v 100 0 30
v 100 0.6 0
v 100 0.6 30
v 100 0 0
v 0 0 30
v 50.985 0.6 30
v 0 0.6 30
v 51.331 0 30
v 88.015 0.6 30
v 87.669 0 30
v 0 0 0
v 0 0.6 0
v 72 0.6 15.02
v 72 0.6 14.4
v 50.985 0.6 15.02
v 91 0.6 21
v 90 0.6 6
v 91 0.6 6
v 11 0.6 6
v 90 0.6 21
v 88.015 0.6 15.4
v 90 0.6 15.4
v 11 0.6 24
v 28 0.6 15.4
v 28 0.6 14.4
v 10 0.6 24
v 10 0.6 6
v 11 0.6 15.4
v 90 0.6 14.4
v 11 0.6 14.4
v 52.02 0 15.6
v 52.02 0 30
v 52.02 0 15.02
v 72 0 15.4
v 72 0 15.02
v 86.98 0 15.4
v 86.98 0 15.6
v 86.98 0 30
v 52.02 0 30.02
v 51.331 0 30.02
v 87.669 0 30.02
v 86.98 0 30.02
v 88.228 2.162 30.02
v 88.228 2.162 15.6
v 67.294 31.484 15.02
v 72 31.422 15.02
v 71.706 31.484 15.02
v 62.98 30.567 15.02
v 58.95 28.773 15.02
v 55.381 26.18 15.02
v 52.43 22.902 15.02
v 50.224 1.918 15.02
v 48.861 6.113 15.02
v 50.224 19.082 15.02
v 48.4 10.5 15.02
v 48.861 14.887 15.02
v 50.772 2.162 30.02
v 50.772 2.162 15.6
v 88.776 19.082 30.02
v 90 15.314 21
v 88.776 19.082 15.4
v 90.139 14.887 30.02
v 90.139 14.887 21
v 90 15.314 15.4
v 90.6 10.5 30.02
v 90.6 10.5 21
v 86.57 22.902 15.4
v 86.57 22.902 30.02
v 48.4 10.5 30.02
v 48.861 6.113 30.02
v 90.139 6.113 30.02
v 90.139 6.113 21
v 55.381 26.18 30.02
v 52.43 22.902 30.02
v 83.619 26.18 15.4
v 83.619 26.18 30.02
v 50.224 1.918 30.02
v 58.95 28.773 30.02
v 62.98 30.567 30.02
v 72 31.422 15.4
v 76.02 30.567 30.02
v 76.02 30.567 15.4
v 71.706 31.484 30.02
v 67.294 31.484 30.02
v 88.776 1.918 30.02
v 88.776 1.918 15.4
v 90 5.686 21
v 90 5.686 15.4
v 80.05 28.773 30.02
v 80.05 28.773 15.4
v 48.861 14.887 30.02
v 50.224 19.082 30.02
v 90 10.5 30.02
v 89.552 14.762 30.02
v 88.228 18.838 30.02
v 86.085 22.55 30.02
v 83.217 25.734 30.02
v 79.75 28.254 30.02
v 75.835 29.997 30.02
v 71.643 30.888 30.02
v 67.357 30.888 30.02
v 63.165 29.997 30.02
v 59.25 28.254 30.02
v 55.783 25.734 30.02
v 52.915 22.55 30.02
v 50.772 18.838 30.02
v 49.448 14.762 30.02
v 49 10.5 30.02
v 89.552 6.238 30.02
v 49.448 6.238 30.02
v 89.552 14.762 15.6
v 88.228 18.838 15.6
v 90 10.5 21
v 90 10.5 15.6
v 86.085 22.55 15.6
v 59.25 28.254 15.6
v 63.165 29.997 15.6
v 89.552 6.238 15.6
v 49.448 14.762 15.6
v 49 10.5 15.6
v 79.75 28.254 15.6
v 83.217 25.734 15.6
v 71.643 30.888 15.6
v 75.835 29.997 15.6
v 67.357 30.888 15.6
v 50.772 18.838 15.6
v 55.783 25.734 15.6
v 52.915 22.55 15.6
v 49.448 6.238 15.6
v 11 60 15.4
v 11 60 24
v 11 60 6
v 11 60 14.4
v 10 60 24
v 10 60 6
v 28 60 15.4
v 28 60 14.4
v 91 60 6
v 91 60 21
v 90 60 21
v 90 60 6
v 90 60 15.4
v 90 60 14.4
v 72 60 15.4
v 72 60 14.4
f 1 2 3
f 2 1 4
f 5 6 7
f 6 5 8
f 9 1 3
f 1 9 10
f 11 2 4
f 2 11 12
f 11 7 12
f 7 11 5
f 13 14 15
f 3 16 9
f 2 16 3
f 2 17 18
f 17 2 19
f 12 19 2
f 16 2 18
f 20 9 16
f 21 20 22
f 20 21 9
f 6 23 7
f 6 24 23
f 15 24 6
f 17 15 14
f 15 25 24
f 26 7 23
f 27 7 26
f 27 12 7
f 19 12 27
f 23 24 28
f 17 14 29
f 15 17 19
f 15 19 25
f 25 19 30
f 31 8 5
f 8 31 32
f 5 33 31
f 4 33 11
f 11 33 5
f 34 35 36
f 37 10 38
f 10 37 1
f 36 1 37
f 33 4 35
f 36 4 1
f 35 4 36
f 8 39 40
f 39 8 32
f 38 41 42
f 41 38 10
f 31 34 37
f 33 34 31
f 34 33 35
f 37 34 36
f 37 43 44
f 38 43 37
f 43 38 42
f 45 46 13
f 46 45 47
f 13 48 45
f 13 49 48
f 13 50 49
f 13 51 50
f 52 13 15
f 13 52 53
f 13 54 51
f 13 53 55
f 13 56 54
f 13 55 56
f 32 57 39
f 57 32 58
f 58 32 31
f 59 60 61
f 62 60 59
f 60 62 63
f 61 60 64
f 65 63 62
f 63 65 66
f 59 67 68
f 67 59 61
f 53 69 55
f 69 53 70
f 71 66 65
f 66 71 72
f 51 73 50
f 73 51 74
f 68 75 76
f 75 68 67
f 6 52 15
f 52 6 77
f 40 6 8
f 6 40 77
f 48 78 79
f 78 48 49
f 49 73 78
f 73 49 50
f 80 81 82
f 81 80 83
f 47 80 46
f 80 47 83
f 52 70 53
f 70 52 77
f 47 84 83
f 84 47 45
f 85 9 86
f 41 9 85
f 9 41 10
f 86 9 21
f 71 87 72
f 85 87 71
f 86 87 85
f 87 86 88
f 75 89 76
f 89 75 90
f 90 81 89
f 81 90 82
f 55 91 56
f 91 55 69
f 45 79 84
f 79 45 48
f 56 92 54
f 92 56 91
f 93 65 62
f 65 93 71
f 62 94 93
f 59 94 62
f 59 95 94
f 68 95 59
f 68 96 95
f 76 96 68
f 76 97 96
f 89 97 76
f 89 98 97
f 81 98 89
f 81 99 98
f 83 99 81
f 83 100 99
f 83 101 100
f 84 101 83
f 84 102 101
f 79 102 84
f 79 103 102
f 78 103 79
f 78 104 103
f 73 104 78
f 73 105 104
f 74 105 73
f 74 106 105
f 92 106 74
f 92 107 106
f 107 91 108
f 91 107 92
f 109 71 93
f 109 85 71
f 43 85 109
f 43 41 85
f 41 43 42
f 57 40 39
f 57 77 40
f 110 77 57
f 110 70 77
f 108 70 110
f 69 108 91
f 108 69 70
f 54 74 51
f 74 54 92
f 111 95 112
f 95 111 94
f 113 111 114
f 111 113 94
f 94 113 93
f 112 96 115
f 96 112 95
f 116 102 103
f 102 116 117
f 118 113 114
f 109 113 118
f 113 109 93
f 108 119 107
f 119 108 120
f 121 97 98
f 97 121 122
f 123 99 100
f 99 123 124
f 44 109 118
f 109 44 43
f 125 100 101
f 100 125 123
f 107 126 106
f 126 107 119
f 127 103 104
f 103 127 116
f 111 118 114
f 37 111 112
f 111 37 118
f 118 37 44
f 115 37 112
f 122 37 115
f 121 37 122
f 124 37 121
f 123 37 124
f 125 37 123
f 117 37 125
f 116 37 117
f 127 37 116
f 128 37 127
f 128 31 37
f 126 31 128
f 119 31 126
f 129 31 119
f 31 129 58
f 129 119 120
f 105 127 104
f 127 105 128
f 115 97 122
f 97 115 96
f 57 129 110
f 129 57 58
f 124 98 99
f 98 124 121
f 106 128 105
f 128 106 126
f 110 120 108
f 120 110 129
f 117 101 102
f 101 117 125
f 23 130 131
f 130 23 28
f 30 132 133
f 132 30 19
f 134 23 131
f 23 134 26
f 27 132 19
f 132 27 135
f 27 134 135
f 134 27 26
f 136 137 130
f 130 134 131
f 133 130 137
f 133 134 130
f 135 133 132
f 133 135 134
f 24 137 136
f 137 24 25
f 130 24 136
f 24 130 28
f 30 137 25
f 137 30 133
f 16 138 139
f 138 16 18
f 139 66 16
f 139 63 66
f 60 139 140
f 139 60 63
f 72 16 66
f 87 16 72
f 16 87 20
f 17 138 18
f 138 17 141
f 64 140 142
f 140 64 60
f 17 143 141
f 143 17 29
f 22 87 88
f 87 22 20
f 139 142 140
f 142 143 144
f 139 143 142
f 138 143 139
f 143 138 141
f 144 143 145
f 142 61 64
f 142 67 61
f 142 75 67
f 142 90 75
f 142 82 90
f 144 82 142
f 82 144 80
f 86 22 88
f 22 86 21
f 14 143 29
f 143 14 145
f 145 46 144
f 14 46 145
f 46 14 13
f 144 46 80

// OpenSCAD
//$fn = 180;

WALL_THICKNESS = 0.6; //1;

CANDLE_CAVITY_DIAMETER = 41;
CANDLE_CAVITY_HEIGHT = 15;

BLOCK_HEIGHT = 30;
BLOCK_LENGTH = 100;
BLOCK_WIDTH = 60;

SHIFT = 10;

ATOM = 0.02;
N = 6;

module basic_shape(with_groves=false) {
    translate([-BLOCK_LENGTH/2, -BLOCK_WIDTH/2, 0])
    difference() {
        cube([BLOCK_LENGTH, BLOCK_WIDTH, BLOCK_HEIGHT]);

        if (with_groves)
        for (i=[-N:N-1]) {
            translate([i*BLOCK_LENGTH/N - GROVE/2, 0, -WALL_THICKNESS])
            rotate([0, 0, -45])
            cube([GROVE, BLOCK_WIDTH*2, BLOCK_HEIGHT]);
        }

        translate([CANDLE_CAVITY_DIAMETER/2 + SHIFT,
                   SHIFT,
                   BLOCK_HEIGHT-CANDLE_CAVITY_HEIGHT+ATOM])
        cylinder(d=CANDLE_CAVITY_DIAMETER, h=CANDLE_CAVITY_HEIGHT);

        translate([BLOCK_LENGTH - CANDLE_CAVITY_DIAMETER/2 - SHIFT,
                   BLOCK_WIDTH- SHIFT,
                   BLOCK_HEIGHT-CANDLE_CAVITY_HEIGHT+ATOM])
        cylinder(d=CANDLE_CAVITY_DIAMETER, h=CANDLE_CAVITY_HEIGHT);
    }
}

module stripes()
        for (i=[-N:N-1]) {
            translate([i*BLOCK_LENGTH/N - BLOCK_LENGTH/2, -BLOCK_WIDTH/2, WALL_THICKNESS])
            rotate([0, 0, -45])
            cube([WALL_THICKNESS, BLOCK_WIDTH*2, BLOCK_HEIGHT/2-WALL_THICKNESS]);
        }


module mink() {
    minkowski() {
        basic_shape();
//        sphere(WALL_THICKNESS*2);
        cube(WALL_THICKNESS*2, true);
    }
}

module skin() {
    difference() {
        mink();
        basic_shape();
    }
}

if(0)
intersection() {
    union() {
        intersection() {
            skin();
            
            translate([-BLOCK_LENGTH, -BLOCK_WIDTH, WALL_THICKNESS])
            cube([BLOCK_LENGTH*2, BLOCK_WIDTH*2, BLOCK_HEIGHT-WALL_THICKNESS-ATOM]);
        }
    }
    translate([0, 0, BLOCK_HEIGHT/2])
    cube([BLOCK_LENGTH-1, BLOCK_WIDTH+1, BLOCK_HEIGHT], true);    
}



difference() {
    cube([BLOCK_LENGTH, WALL_THICKNESS, BLOCK_HEIGHT]);
    translate([BLOCK_LENGTH - CANDLE_CAVITY_DIAMETER/2 - SHIFT,
               CANDLE_CAVITY_DIAMETER/2- SHIFT,
               BLOCK_HEIGHT-CANDLE_CAVITY_HEIGHT+ATOM])
    cylinder(d=CANDLE_CAVITY_DIAMETER, h=CANDLE_CAVITY_HEIGHT);
}

difference() {
    translate([BLOCK_LENGTH - CANDLE_CAVITY_DIAMETER/2 - SHIFT,
               CANDLE_CAVITY_DIAMETER/2- SHIFT,
               BLOCK_HEIGHT-CANDLE_CAVITY_HEIGHT+ATOM])
    cylinder(d=CANDLE_CAVITY_DIAMETER+WALL_THICKNESS*2, h=CANDLE_CAVITY_HEIGHT);

    translate([BLOCK_LENGTH - CANDLE_CAVITY_DIAMETER/2 - SHIFT,
               CANDLE_CAVITY_DIAMETER/2- SHIFT,
               BLOCK_HEIGHT-CANDLE_CAVITY_HEIGHT+WALL_THICKNESS])
    cylinder(d=CANDLE_CAVITY_DIAMETER, h=CANDLE_CAVITY_HEIGHT);
 
    translate([0, -BLOCK_WIDTH, WALL_THICKNESS])
    cube([BLOCK_LENGTH, BLOCK_WIDTH, BLOCK_HEIGHT]);    
}

    translate([SHIFT, 0, BLOCK_HEIGHT*.2])
    cube([1, BLOCK_WIDTH, BLOCK_HEIGHT*.6]);    

    translate([SHIFT, 0, BLOCK_HEIGHT*.5 - WALL_THICKNESS])
    cube([BLOCK_HEIGHT*.6, BLOCK_WIDTH, 1]);    


    translate([BLOCK_LENGTH-SHIFT, 0, BLOCK_HEIGHT*.2])
    cube([1, BLOCK_WIDTH, BLOCK_HEIGHT*.5]);    

    translate([BLOCK_LENGTH-BLOCK_HEIGHT*.6-SHIFT, 0, BLOCK_HEIGHT*.5 -WALL_THICKNESS])
    cube([BLOCK_HEIGHT*.6, BLOCK_WIDTH, 1]);    
